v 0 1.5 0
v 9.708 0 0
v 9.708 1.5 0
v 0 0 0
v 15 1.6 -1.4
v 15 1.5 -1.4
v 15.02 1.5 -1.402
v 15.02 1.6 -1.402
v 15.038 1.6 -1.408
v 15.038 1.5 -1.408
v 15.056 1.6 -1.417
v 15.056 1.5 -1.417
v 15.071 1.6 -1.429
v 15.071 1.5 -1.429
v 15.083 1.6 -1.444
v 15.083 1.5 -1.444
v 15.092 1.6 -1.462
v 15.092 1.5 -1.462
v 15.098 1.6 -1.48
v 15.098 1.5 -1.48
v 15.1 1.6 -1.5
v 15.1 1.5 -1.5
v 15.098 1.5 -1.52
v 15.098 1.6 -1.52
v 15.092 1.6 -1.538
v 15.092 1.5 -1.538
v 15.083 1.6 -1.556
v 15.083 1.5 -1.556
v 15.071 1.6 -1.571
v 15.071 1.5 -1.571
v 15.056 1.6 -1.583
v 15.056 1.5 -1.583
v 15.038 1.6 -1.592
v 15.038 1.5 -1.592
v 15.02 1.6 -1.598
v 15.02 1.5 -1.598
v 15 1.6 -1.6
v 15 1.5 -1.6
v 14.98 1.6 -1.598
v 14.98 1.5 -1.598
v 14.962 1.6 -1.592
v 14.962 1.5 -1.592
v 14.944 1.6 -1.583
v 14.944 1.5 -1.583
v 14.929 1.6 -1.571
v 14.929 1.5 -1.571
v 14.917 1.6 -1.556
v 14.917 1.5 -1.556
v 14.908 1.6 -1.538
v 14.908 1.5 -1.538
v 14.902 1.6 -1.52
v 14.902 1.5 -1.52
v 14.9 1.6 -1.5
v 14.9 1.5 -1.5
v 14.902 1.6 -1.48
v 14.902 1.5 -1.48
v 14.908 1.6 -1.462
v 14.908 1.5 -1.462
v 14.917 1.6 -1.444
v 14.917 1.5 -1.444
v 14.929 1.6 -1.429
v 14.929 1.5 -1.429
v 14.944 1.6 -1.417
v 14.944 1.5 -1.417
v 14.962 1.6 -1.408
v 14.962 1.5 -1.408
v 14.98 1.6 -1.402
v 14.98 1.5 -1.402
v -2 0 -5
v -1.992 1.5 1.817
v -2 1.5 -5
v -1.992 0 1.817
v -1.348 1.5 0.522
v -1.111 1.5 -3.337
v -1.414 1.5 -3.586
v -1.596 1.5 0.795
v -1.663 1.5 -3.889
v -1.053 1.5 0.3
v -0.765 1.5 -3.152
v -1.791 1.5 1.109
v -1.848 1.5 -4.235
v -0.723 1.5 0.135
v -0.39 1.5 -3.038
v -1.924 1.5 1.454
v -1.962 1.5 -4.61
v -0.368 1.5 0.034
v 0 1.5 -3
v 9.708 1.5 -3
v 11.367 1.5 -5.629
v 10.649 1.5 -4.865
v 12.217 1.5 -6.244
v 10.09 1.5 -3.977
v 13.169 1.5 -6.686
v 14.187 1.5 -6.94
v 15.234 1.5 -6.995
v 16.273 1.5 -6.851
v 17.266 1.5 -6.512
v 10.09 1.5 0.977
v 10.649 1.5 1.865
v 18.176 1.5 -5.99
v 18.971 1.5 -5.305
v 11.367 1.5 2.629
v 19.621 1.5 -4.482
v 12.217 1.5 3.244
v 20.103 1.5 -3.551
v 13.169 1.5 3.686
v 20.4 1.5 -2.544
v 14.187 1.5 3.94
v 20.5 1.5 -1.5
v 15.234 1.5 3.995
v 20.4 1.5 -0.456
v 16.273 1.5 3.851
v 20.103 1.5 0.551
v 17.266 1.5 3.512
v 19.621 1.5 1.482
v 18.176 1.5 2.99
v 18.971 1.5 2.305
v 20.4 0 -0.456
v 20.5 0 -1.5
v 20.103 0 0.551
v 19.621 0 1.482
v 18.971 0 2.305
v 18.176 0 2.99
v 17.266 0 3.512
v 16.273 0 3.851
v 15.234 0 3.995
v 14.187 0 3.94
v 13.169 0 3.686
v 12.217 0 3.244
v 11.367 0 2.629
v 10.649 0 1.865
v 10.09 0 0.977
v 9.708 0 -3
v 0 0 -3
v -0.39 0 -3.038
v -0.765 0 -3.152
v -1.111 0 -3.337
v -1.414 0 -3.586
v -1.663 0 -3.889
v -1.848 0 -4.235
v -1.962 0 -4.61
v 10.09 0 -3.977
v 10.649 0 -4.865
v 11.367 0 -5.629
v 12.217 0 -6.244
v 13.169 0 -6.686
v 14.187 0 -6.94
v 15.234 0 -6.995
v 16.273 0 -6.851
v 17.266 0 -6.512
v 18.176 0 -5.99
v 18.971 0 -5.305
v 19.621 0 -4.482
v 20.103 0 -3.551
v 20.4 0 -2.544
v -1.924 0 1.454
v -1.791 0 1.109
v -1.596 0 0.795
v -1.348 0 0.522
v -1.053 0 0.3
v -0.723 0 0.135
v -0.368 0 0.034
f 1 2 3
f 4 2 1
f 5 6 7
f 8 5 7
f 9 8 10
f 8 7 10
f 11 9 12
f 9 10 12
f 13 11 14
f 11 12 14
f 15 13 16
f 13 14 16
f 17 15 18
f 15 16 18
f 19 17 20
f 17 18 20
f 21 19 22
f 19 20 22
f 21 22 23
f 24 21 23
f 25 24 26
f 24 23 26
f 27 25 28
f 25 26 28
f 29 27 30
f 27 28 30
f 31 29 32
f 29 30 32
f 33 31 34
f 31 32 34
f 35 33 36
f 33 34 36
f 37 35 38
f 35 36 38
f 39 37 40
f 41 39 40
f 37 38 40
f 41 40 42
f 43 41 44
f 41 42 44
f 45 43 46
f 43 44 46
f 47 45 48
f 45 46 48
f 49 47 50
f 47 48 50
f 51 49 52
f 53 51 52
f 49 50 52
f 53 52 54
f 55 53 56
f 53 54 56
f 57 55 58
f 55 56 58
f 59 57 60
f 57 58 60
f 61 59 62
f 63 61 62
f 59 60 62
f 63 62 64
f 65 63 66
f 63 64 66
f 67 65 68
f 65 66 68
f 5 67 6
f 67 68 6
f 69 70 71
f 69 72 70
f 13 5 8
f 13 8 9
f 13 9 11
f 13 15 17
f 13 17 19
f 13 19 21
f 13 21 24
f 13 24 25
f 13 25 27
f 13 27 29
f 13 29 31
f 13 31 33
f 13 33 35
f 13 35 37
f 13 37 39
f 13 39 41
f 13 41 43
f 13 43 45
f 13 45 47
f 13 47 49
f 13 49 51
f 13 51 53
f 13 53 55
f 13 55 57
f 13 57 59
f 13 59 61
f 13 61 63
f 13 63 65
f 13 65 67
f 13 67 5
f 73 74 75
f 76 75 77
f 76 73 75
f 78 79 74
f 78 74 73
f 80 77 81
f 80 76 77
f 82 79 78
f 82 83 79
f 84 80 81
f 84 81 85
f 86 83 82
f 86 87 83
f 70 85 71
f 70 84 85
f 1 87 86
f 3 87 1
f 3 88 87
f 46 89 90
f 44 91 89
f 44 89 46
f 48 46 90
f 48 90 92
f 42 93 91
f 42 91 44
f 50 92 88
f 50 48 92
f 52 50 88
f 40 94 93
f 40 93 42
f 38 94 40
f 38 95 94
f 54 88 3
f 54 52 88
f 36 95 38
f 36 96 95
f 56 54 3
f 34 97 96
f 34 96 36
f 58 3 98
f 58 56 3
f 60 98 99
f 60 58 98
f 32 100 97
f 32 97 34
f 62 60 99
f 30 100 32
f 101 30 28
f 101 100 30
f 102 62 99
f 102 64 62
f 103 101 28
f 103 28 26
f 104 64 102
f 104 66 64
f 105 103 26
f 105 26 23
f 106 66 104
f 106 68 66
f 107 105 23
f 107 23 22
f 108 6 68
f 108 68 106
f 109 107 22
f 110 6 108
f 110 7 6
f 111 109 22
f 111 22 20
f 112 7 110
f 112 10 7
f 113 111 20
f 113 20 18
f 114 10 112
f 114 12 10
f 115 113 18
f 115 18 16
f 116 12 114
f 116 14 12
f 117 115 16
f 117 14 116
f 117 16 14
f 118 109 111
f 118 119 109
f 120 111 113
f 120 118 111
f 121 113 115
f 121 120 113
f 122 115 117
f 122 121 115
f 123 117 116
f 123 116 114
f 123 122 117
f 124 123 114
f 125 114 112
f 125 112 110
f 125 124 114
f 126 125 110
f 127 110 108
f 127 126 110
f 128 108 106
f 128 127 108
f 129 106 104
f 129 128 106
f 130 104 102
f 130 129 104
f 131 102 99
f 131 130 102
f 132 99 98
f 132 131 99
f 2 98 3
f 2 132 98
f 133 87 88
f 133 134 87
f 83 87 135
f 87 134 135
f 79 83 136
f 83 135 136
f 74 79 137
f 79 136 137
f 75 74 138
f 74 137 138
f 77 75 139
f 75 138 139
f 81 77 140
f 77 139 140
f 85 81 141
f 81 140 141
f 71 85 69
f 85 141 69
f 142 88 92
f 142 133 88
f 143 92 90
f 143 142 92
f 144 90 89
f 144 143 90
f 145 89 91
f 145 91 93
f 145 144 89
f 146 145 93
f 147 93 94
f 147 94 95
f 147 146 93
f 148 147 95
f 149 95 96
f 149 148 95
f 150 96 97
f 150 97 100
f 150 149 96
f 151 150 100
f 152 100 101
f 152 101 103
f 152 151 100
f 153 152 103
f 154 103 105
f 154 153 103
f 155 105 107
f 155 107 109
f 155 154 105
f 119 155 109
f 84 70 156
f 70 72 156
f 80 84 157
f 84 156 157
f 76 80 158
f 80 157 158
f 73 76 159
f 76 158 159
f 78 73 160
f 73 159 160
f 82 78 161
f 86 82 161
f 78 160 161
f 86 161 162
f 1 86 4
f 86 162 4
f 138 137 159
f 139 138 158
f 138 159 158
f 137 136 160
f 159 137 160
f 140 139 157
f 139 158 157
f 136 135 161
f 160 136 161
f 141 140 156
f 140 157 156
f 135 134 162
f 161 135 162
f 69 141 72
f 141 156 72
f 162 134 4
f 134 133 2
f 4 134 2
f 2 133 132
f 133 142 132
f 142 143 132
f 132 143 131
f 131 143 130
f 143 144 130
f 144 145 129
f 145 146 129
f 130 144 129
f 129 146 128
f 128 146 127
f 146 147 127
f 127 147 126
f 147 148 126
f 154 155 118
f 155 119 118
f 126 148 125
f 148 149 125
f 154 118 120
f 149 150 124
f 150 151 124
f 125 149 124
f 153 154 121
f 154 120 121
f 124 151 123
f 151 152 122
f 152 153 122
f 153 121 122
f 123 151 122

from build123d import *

# Parameters (mm, degrees)
ESBO_O2_R                = 0.1
RESSALTO_EXTRUS_O2_DEPTH = 0.1


with BuildPart() as part:
    # Ressalto-extrusão1: read off the stored shape, not the designer's step
    # Ressalto-extrusão1: loft between two sections, ruled curve by curve
    ressalto_extrus_o1_from = [
        Edge.make_three_point_arc((-1.991569883, 1.5, 1.816562273), (-1.347799048, 1.5, 0.522353991), (0, 1.5, 0)),
        Edge.make_three_point_arc((9.708497378, 1.5, -3), (15.757210532, 1.5, -6.947626291), (20.5, 1.5, -1.5)),
        Edge.make_three_point_arc((20.5, 1.5, -1.5), (15.757210532, 1.5, 3.947626291), (9.708497378, 1.5, 0)),
        Edge.make_three_point_arc((0, 1.5, -3), (-1.414213562, 1.5, -3.585786438), (-2, 1.5, -5)),
        Edge.make_line((9.708497378, 1.5, 0), (0, 1.5, 0)),
        Edge.make_line((0, 1.5, -3), (9.708497378, 1.5, -3)),
        Edge.make_line((-1.991569883, 1.5, 1.816562273), (-2, 1.5, -5)),
    ]
    ressalto_extrus_o1_to = [
        Edge.make_three_point_arc((-1.991569883, 0, 1.816562273), (-1.347799048, 0, 0.522353991), (0, 0, 0)),
        Edge.make_three_point_arc((9.708497378, 0, -3), (15.757210532, 0, -6.947626291), (20.5, 0, -1.5)),
        Edge.make_three_point_arc((20.5, 0, -1.5), (15.757210532, 0, 3.947626291), (9.708497378, 0, 0)),
        Edge.make_three_point_arc((0, 0, -3), (-1.414213562, 0, -3.585786438), (-2, 0, -5)),
        Edge.make_line((9.708497378, 0, 0), (0, 0, 0)),
        Edge.make_line((0, 0, -3), (9.708497378, 0, -3)),
        Edge.make_line((-1.991569883, 0, 1.816562273), (-2, 0, -5)),
    ]
    ressalto_extrus_o1 = Solid(Shell([*[Face.make_surface_from_curves(ressalto_extrus_o1_from[k], ressalto_extrus_o1_to[k]) for k in range(7)], Face(Wire(ressalto_extrus_o1_from)), Face(Wire(ressalto_extrus_o1_to))]))
    add(ressalto_extrus_o1)

    # Esboço2 → Ressalto-extrusão2 (add)
    with BuildSketch(Plane(origin=(0, 1.5, 0), x_dir=(1, 0, 0), z_dir=(0, 1, 0))):
        with Locations(Location((15, 1.5, 0), (0, 0, 270))):
            Circle(ESBO_O2_R)
    extrude(amount=RESSALTO_EXTRUS_O2_DEPTH)


solid = part.part
